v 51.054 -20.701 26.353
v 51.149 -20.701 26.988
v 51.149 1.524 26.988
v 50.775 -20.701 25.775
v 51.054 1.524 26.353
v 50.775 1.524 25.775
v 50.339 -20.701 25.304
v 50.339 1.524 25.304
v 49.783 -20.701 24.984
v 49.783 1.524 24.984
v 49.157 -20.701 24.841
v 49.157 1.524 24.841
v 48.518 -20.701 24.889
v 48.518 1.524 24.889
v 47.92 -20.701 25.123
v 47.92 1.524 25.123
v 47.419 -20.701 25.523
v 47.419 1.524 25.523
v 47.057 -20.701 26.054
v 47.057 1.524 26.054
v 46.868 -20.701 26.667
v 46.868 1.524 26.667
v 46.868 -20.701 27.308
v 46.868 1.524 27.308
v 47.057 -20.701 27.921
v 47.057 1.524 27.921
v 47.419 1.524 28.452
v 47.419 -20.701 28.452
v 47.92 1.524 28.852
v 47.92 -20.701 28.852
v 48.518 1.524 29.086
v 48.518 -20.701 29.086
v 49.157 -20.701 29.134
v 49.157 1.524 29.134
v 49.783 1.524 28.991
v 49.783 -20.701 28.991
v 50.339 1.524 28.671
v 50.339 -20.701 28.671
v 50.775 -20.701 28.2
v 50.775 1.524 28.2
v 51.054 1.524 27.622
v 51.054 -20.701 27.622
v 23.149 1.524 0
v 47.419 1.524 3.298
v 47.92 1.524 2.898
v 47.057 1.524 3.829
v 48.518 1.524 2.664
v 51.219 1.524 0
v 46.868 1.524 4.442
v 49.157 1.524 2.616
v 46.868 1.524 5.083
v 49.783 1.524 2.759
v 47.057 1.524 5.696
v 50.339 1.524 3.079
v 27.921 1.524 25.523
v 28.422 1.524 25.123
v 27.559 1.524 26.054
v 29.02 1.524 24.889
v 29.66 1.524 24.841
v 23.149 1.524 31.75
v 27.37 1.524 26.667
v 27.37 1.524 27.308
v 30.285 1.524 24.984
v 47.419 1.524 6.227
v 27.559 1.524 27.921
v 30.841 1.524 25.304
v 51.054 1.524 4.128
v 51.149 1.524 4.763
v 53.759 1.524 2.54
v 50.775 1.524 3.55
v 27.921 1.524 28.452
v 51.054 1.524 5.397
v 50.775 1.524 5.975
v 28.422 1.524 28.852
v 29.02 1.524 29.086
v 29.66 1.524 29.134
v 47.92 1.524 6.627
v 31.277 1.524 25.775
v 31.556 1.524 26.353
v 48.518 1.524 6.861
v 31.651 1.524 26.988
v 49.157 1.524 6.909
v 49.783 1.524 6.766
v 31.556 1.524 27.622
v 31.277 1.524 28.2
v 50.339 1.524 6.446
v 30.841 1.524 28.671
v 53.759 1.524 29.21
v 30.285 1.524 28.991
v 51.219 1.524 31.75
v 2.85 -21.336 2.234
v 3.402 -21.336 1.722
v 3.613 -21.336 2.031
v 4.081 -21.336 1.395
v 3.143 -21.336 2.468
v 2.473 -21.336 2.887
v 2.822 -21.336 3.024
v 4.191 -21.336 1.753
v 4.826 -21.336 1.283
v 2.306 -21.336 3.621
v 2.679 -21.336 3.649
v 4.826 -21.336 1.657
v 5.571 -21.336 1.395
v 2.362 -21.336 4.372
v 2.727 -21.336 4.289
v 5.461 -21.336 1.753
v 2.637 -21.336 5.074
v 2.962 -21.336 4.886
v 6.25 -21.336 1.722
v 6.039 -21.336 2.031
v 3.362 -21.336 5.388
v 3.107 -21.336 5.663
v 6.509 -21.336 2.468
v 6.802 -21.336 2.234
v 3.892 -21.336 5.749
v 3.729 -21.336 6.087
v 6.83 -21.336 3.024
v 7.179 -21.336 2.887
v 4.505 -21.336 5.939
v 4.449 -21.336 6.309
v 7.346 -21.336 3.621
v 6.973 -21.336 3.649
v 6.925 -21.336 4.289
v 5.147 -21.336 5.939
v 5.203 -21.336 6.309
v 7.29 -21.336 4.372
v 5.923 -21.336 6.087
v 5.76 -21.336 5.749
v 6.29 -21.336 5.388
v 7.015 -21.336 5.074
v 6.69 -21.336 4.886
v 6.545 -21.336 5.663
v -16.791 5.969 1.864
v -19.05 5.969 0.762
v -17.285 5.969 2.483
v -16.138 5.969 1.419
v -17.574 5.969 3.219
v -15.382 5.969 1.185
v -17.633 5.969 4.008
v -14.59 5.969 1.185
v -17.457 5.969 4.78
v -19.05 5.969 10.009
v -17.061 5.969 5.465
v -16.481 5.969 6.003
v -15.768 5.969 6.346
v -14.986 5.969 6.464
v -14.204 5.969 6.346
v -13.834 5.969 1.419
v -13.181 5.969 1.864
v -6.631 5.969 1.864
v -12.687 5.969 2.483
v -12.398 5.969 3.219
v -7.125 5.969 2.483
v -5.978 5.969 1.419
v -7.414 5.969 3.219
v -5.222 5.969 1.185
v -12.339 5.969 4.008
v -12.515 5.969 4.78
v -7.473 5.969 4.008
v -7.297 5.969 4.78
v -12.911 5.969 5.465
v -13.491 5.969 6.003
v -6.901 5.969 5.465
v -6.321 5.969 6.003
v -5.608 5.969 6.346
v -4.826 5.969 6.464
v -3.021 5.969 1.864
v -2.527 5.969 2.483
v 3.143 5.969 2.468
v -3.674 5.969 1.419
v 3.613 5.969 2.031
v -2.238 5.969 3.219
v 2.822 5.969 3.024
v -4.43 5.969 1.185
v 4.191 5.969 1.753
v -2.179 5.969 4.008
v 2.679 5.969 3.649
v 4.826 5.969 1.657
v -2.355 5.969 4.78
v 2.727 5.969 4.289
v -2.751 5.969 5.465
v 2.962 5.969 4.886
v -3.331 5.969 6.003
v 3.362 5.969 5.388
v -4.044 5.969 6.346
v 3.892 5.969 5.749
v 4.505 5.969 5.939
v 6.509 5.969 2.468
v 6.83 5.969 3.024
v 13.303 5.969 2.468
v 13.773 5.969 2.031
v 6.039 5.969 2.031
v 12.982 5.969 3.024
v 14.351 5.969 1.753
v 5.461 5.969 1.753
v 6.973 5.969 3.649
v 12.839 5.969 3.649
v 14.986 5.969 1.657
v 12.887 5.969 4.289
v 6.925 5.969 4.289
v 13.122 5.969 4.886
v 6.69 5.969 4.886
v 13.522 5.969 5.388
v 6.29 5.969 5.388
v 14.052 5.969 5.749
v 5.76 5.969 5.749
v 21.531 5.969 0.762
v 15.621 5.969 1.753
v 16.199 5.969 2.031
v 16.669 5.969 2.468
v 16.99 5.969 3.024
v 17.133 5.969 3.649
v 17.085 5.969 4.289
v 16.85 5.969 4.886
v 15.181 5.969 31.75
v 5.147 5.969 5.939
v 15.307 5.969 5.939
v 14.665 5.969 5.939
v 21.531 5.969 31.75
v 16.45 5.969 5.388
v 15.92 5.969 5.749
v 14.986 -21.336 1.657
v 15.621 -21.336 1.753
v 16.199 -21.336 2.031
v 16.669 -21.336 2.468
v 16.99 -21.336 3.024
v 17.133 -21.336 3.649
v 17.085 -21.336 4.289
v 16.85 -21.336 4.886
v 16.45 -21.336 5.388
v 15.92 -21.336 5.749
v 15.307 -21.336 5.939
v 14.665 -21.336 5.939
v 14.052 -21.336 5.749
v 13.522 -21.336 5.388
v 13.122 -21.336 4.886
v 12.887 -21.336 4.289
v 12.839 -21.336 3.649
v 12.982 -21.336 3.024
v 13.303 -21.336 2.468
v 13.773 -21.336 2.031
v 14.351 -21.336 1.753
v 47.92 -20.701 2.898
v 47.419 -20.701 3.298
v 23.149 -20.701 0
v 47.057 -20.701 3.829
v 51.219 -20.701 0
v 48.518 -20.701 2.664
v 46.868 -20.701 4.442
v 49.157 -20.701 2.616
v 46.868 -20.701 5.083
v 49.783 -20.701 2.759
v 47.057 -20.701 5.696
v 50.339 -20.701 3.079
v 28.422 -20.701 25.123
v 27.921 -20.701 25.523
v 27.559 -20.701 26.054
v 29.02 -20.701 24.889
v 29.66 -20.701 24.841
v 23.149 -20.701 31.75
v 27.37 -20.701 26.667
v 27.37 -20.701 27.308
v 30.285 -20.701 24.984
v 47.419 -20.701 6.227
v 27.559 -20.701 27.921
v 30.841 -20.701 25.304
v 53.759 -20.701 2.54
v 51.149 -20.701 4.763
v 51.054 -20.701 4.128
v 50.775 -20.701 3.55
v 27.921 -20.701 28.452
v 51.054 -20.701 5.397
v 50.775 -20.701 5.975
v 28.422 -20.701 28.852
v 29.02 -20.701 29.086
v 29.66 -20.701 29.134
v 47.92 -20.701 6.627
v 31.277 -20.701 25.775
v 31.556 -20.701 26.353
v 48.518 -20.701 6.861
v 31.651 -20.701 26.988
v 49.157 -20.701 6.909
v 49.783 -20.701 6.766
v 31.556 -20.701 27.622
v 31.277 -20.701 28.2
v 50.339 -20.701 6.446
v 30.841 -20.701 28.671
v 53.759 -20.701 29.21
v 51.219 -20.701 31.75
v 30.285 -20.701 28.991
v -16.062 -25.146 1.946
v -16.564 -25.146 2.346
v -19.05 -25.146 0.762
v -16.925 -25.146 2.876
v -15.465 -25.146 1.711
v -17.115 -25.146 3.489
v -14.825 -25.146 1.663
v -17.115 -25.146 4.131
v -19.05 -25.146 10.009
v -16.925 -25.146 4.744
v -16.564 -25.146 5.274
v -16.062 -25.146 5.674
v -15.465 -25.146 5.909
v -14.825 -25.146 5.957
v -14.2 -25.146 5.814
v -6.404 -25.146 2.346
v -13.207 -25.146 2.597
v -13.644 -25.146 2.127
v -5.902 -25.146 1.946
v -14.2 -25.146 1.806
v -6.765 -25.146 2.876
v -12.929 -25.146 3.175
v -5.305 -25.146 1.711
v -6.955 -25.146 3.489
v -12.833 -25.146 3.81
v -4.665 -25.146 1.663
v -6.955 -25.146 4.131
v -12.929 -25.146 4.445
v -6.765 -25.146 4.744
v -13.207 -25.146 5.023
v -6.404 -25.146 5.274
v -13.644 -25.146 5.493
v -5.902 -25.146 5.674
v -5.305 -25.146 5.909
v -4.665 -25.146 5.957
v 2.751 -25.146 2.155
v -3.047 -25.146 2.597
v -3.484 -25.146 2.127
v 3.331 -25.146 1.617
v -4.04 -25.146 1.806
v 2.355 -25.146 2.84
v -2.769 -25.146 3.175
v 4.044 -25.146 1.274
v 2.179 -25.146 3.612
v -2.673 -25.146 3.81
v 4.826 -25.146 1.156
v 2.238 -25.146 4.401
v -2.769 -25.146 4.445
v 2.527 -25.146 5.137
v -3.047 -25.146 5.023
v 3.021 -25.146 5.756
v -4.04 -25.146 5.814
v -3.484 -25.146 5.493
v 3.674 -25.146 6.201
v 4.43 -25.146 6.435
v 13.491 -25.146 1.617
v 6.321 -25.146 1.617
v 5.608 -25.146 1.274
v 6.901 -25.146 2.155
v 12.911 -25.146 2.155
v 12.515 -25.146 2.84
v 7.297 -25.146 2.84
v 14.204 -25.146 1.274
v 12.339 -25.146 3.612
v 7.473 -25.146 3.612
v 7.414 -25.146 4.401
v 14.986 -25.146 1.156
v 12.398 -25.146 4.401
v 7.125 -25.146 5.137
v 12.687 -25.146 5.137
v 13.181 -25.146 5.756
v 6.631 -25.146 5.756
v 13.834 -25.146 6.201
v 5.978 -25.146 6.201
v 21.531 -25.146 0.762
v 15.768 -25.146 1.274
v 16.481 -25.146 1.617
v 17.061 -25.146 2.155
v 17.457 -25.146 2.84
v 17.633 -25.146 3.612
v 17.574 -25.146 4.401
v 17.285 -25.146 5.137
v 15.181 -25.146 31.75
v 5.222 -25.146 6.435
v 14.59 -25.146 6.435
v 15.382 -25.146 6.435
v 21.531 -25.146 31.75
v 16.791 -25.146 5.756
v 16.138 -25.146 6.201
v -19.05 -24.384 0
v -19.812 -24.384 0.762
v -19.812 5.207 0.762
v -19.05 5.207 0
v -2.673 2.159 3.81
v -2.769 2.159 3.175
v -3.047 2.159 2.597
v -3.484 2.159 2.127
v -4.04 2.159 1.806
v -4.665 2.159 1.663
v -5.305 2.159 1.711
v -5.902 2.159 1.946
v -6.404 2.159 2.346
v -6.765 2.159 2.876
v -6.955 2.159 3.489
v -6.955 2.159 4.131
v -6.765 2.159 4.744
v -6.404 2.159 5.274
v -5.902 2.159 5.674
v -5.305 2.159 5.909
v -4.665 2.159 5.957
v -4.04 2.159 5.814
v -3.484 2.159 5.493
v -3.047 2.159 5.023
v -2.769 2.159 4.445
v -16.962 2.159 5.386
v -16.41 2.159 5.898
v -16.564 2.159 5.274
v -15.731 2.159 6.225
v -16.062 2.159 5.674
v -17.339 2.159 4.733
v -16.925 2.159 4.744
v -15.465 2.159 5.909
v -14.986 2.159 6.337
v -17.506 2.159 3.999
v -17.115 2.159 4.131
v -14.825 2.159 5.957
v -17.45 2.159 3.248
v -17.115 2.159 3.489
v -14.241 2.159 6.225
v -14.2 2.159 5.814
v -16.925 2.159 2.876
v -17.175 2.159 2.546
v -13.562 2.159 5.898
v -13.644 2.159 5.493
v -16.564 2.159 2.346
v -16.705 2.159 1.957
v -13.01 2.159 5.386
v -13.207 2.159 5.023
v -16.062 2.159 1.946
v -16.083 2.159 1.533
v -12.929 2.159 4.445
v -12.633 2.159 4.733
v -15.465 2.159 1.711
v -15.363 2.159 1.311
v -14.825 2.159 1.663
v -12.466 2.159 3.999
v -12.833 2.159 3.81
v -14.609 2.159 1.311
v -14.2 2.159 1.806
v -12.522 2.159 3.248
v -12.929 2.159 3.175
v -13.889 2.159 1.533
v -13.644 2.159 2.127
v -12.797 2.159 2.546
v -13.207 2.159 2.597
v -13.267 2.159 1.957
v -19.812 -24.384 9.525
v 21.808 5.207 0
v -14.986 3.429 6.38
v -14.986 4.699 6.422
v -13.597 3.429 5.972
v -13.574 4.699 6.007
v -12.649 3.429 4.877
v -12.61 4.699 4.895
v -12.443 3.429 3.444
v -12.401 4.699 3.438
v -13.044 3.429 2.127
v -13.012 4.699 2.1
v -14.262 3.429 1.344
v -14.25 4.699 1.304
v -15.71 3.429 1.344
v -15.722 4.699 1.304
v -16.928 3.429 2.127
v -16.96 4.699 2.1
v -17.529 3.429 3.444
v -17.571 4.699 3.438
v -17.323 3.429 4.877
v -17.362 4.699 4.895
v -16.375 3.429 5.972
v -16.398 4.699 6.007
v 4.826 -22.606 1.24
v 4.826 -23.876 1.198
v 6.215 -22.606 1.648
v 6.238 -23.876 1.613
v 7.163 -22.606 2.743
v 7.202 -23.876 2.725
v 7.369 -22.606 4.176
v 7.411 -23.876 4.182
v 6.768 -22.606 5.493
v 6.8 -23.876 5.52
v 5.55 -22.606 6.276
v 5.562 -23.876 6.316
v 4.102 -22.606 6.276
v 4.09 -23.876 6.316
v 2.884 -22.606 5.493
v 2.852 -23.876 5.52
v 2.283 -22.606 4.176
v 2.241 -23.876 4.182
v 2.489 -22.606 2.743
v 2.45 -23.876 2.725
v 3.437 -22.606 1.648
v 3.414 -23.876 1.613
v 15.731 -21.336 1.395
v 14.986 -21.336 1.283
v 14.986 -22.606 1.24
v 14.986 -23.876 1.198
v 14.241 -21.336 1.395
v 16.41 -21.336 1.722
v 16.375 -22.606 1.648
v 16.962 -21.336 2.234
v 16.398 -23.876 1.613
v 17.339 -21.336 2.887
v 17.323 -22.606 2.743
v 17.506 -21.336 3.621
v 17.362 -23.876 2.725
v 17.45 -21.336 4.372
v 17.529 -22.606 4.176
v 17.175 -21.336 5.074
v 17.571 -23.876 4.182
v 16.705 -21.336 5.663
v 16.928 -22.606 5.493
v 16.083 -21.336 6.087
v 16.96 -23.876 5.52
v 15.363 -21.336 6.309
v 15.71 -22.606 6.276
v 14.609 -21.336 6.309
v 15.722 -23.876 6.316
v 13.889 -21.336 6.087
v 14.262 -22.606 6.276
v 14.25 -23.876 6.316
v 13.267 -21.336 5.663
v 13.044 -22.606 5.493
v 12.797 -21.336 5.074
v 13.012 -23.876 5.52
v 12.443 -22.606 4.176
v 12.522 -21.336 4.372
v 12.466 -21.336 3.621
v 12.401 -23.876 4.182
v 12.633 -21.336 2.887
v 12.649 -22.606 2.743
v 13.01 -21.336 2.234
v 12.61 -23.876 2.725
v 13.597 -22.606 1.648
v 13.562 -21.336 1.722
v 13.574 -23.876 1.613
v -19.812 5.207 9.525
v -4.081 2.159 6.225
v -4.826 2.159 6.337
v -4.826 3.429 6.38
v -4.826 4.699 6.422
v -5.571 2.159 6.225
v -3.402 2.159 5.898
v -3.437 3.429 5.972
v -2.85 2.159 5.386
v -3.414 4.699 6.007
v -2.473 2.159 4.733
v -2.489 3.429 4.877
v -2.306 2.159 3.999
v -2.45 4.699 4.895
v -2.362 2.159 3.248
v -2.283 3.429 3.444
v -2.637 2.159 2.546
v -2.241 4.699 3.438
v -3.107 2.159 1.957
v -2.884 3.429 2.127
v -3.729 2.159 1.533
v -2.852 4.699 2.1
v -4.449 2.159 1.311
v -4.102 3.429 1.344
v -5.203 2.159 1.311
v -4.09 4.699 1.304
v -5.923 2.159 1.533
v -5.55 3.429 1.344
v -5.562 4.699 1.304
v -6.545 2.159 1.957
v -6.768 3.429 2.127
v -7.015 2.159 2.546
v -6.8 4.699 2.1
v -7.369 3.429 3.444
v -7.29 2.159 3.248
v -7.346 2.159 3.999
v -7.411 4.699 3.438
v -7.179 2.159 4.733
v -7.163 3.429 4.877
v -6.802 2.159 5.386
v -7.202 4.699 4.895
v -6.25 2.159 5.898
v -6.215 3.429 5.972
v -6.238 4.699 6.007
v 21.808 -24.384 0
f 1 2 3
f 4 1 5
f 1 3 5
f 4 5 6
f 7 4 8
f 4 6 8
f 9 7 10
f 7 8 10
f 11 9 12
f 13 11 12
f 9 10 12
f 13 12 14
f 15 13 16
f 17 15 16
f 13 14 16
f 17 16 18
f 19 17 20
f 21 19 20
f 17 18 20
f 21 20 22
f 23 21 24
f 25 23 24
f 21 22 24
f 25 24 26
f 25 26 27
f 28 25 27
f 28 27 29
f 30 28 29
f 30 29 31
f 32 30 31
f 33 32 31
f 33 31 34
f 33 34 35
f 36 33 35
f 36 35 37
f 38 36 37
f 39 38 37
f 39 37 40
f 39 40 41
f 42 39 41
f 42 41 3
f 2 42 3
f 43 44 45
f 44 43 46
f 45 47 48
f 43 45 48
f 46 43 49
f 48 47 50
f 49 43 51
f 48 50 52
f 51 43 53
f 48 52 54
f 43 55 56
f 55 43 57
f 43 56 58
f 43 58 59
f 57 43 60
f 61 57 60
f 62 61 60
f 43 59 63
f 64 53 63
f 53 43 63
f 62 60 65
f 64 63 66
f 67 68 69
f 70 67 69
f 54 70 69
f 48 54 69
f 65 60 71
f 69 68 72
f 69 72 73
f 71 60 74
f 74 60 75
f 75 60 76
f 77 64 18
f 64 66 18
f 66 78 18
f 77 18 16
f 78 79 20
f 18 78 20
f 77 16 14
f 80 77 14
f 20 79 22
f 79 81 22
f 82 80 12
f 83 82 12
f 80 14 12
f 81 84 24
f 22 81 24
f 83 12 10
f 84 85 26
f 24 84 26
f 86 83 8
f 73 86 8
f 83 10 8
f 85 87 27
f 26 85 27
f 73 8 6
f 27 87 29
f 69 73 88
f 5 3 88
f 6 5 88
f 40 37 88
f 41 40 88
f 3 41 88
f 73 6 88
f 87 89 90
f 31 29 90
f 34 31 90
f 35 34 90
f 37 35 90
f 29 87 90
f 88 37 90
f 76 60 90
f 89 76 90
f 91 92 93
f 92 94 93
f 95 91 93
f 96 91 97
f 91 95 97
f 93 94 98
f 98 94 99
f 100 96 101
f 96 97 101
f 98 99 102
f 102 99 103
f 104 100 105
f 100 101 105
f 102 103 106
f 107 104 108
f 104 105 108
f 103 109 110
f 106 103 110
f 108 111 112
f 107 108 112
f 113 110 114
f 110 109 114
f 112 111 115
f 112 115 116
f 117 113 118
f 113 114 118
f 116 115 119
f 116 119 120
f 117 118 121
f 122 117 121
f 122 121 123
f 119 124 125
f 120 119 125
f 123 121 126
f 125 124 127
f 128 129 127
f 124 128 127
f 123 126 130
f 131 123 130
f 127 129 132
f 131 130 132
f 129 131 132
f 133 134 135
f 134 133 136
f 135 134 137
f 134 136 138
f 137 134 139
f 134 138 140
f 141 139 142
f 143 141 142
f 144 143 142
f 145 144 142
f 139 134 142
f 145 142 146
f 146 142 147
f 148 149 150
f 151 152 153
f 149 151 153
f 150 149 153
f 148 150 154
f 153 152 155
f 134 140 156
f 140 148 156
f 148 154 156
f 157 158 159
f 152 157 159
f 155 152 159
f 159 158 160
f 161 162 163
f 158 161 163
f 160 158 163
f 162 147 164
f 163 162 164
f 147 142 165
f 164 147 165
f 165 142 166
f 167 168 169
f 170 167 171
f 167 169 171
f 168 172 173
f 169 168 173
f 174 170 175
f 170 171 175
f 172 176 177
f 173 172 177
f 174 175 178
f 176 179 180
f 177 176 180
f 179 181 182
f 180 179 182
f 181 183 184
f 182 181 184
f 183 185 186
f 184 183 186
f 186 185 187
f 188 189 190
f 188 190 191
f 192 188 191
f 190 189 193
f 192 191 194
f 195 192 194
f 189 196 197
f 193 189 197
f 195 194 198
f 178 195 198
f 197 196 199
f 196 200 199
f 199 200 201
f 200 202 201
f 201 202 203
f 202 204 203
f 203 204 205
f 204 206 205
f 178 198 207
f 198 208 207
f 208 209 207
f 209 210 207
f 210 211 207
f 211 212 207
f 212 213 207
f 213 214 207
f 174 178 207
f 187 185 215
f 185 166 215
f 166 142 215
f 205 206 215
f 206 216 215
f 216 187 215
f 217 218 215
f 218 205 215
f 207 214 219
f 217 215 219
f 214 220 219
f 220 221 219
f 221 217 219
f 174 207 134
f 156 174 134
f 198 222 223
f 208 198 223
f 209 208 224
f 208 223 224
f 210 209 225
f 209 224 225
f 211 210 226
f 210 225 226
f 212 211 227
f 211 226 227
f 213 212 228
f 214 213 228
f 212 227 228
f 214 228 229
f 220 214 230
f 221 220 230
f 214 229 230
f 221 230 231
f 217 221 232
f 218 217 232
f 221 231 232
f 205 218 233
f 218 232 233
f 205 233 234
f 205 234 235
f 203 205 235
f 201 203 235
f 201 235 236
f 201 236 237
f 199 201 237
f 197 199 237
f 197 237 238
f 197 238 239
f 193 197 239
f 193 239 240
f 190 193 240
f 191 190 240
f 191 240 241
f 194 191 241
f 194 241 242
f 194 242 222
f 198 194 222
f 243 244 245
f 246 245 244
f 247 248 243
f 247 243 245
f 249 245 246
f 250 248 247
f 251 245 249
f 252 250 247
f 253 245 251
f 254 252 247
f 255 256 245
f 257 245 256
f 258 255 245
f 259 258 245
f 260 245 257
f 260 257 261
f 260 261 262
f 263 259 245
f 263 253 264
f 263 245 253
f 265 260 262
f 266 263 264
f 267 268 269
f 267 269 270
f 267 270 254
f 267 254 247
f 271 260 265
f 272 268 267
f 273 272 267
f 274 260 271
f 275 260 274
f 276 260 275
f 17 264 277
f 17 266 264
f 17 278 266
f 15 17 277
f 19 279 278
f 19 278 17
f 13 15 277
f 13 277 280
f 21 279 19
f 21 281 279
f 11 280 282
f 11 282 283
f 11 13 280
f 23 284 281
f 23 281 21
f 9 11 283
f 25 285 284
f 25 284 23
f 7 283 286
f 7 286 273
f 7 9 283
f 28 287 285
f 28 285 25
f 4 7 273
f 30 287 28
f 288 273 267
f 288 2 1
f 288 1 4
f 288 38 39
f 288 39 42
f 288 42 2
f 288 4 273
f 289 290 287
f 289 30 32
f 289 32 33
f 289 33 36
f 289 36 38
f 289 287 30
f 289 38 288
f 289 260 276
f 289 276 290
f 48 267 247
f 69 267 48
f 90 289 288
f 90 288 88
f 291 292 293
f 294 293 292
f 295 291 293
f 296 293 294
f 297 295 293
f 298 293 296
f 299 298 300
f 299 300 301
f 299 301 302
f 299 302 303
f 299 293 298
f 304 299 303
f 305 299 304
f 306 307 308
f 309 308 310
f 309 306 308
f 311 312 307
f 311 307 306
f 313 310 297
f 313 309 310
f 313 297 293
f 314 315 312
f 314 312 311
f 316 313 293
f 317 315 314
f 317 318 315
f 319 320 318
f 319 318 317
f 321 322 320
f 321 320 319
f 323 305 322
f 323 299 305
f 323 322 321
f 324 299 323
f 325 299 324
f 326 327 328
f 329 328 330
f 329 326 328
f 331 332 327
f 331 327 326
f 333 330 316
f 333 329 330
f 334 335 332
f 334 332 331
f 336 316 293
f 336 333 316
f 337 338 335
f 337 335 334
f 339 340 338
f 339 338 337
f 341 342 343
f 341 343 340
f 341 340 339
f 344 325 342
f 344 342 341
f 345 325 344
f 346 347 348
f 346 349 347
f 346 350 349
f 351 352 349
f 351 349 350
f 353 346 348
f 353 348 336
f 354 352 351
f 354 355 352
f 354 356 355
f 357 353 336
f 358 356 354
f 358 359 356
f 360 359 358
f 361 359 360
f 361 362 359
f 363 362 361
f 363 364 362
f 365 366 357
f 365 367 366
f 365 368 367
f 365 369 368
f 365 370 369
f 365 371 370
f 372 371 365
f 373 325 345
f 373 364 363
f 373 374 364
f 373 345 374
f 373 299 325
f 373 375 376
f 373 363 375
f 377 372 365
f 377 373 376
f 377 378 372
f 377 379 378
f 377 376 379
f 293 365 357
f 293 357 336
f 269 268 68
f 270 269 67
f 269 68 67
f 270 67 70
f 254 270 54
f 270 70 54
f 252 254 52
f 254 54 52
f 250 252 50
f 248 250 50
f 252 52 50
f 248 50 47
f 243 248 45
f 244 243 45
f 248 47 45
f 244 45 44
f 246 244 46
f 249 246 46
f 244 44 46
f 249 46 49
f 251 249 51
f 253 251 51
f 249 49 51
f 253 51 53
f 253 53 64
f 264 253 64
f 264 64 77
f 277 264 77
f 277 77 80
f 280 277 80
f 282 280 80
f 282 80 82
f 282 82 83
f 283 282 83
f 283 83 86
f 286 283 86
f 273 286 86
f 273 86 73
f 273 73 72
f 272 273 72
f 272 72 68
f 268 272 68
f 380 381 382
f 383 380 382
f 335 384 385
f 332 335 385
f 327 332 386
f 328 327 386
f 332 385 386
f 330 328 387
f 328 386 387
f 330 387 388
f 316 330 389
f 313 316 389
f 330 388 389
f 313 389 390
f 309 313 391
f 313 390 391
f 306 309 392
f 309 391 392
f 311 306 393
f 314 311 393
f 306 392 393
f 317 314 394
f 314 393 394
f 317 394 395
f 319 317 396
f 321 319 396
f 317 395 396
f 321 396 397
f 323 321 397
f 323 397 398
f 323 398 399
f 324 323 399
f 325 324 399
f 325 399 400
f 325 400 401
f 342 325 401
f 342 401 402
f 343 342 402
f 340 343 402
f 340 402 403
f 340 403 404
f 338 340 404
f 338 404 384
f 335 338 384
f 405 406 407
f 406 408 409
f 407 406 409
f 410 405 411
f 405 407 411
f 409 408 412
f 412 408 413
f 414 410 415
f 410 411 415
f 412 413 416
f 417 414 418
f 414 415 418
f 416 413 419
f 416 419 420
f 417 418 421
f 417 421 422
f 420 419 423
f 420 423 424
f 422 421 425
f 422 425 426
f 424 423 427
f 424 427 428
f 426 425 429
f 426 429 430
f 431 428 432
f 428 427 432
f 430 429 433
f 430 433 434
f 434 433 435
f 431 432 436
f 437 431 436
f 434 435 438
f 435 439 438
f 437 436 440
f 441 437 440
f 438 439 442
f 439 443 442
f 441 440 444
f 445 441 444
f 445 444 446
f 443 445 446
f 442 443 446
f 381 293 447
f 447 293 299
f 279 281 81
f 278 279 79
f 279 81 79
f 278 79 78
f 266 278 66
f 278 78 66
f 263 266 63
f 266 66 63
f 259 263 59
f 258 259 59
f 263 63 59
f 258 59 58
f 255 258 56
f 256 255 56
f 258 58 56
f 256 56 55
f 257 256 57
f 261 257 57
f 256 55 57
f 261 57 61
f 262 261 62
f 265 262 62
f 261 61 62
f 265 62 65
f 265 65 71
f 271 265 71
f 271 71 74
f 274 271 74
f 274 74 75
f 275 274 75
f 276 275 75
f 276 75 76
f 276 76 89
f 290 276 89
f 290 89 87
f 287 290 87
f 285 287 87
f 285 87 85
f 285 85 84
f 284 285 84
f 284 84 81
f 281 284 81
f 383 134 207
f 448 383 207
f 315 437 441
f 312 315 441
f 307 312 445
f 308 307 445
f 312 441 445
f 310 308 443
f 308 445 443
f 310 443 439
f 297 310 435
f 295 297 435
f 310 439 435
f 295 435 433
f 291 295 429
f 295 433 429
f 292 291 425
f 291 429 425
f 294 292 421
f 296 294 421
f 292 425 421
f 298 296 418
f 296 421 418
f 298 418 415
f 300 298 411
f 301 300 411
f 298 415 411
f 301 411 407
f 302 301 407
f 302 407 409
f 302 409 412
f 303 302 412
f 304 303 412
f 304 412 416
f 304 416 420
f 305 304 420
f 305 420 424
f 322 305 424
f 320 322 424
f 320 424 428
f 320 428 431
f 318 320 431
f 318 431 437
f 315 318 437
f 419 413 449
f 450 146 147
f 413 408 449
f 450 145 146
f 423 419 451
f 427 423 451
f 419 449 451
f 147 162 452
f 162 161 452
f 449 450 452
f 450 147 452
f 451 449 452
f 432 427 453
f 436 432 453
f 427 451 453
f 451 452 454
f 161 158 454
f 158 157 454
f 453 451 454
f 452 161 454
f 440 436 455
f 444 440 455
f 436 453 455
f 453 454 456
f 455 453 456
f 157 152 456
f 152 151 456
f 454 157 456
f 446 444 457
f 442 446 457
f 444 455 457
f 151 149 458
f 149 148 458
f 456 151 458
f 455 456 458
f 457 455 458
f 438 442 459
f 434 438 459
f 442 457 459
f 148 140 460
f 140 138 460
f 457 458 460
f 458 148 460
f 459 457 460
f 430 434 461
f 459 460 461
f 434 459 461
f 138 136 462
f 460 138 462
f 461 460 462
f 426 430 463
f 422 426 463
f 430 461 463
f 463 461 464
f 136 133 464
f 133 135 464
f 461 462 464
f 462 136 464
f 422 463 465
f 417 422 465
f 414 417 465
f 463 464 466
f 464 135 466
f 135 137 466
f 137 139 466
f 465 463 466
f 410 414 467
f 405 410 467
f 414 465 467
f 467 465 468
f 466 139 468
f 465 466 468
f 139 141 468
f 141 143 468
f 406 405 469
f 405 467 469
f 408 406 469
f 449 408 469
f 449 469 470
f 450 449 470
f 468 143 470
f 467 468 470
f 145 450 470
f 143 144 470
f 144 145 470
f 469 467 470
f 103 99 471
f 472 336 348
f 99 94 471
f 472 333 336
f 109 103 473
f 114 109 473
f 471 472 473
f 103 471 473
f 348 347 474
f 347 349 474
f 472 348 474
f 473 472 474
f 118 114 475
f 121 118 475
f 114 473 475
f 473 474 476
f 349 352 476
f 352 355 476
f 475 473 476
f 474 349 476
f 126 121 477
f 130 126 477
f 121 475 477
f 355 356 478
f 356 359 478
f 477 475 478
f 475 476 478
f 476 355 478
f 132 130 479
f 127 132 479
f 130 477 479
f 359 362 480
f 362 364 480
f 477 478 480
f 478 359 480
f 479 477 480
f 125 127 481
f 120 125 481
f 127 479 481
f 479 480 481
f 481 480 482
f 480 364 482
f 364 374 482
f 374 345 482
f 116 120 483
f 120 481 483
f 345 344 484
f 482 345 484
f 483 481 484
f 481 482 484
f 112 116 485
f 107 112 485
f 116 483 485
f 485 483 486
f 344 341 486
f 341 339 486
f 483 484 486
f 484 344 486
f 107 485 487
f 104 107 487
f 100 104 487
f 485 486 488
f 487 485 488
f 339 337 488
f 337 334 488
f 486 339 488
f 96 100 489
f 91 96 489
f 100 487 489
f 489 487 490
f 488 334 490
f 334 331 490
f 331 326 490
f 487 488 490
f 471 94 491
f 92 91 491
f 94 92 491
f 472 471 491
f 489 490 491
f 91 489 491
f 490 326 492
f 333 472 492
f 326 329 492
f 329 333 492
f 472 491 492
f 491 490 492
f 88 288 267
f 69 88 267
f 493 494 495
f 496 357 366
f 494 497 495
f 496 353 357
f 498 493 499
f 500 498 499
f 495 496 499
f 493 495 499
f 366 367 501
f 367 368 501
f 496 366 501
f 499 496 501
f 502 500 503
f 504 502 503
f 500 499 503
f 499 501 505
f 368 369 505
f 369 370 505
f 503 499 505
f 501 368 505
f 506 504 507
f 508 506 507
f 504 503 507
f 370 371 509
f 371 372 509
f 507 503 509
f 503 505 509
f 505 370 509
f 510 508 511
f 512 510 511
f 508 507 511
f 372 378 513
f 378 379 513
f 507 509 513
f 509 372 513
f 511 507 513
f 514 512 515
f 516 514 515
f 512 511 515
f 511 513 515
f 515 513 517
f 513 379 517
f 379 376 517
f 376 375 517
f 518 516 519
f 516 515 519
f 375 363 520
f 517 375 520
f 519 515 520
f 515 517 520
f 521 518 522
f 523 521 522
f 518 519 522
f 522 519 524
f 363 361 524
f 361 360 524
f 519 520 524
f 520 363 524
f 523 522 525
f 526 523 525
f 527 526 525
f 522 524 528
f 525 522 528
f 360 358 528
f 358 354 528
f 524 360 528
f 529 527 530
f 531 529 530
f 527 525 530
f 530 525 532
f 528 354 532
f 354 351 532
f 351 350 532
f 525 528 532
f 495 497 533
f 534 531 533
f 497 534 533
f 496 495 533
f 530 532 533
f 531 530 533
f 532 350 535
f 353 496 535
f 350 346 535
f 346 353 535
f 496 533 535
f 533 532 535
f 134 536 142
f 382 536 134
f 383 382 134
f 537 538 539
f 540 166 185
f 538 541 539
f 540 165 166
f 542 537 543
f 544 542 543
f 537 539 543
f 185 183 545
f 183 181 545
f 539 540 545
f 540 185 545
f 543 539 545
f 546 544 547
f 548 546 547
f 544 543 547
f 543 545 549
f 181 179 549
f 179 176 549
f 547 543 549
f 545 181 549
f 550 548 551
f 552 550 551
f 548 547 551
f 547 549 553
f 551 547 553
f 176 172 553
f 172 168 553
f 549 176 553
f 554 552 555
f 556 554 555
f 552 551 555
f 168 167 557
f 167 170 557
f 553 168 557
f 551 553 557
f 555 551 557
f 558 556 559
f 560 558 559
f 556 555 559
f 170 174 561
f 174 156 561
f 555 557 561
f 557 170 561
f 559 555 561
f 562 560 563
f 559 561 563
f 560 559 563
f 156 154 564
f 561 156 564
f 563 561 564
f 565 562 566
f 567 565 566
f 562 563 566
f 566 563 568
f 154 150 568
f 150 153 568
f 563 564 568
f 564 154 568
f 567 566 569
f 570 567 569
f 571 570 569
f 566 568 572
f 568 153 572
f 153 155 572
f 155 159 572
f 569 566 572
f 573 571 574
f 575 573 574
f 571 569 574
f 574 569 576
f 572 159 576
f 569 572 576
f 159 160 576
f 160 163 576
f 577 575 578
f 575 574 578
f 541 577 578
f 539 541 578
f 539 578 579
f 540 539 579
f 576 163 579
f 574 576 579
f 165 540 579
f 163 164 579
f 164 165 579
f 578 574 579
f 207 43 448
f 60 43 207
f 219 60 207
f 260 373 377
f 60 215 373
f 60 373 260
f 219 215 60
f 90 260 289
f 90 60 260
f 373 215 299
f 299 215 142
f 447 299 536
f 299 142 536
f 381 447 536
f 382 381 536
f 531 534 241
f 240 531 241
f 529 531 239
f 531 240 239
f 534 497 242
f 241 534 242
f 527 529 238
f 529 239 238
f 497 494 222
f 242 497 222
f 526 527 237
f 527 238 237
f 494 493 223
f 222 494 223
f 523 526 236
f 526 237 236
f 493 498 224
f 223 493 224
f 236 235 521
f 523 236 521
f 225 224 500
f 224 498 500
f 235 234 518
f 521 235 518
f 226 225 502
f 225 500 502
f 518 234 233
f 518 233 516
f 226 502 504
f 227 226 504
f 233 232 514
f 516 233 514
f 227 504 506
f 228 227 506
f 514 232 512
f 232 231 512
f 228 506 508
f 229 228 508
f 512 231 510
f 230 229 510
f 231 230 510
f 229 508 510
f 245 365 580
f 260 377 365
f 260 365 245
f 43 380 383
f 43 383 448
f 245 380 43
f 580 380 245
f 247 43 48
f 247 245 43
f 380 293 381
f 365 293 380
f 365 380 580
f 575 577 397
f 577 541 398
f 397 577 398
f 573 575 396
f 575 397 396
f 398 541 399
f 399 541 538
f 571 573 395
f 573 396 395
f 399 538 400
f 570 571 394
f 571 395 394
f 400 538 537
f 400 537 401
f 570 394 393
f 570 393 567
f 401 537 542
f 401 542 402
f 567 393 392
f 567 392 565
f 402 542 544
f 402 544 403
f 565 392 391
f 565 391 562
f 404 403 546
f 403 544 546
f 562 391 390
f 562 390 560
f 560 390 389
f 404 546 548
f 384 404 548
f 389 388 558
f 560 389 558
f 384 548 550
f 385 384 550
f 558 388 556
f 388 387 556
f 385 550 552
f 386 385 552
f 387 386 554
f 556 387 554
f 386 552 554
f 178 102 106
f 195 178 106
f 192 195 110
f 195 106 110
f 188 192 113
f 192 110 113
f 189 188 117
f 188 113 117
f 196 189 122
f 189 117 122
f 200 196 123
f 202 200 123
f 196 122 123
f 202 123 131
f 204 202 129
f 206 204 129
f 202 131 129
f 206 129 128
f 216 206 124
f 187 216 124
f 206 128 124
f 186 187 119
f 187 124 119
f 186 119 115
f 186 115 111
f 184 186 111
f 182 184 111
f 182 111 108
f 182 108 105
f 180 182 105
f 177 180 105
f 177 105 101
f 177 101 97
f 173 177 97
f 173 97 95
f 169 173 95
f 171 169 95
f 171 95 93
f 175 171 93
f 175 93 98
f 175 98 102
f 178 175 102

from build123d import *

# Parameters (mm, degrees)
SKETCH1_W                       = 42.960806382
SKETCH1_H                       = 31.115
BOSS_EXTRUDE1_DEPTH             = 12.7
SKETCH2_W                       = 42.960806382
SKETCH2_H                       = 22.225
BOSS_EXTRUDE2_DEPTH             = 19.05
BOSS_EXTRUDE3_DEPTH             = 22.225
DRAFT1_START                    = 15
DRAFT1_OUTLINE_W                = 22.225
DRAFT1_OUTLINE_H                = 19.270002336
DRAFT1_DEPTH                    = 6.752762537
BOSS_EXTRUDE4_REACH             = 69.308
SKETCH6_W                       = 42.960806382
SKETCH6_H                       = 4.445
DRAFT3_ANGLE                    = 20
DRAFT4_ANGLE                    = 20
BOSS_EXTRUDE5_DEPTH             = 22.225
F_6_CLEARANCE_HOLE1_D           = 4.3053
F_6_CLEARANCE_HOLE2_D           = 4.3053
F_6_CLEARANCE_HOLE2_ON_FACE_2_D = 4.3053
HOLE1_AT_2_COUNT                = 2
HOLE1_AT_2_PITCH                = 10.16
HOLE2_AT_2_COUNT                = 2
HOLE2_AT_2_PITCH                = 10.16
CUT_EXTRUDE1_DEPTH              = 70.758470007
CHAMFER1_SIZE                   = 2.54
CHAMFER2_SIZE                   = 0.762


with BuildPart() as part:
    # Sketch1 → Boss-Extrude1 (new body)
    with BuildSketch(Plane.XY):
        with Locations((1.668403191, -9.5885)):
            Rectangle(SKETCH1_W, SKETCH1_H)
    extrude(amount=BOSS_EXTRUDE1_DEPTH)

    # Sketch2 → Boss-Extrude2 (add)
    with BuildSketch(Plane.XY.offset(12.7)):
        with Locations((1.668403191, -9.5885)):
            Rectangle(SKETCH2_W, SKETCH2_H)
    extrude(amount=BOSS_EXTRUDE2_DEPTH)

    # Sketch3 → Boss-Extrude3 (add)
    with BuildSketch(Plane.XZ.offset(20.701)):
        Polygon((23.148806382, 31.75), (53.759077492, 31.75), (53.759077492, 0), (44.234077492, 0), (44.234077492, 18.107878998), (23.148806382, 18.107878998), align=None)
    extrude(amount=-BOSS_EXTRUDE3_DEPTH)

    # Draft1: read off the stored shape, not the designer's step
    # Draft1 outline → Draft1 (add)
    with BuildSketch(Plane(origin=(0, 0, 0), x_dir=(0, 1, 0), z_dir=(0.9396926207859083, 0, -0.3420201433256691)).offset(DRAFT1_START)):
        with Locations((-9.5885, 17.552359245)):
            Rectangle(DRAFT1_OUTLINE_W, DRAFT1_OUTLINE_H)
    extrude(amount=DRAFT1_DEPTH)

    # Sketch6 → Boss-Extrude4 (add, up to next)
    with BuildSketch(Plane.XY.offset(31.75), mode=Mode.PRIVATE) as boss_extrude4_sk1:
        with Locations((1.668403191, 3.7465)):
            Rectangle(SKETCH6_W, SKETCH6_H)
    boss_extrude4_tool1 = extrude(boss_extrude4_sk1.sketch, amount=-BOSS_EXTRUDE4_REACH, mode=Mode.PRIVATE) - part.part
    # Sketch6 → Boss-Extrude4 (add, up to next)
    with BuildSketch(Plane.XY.offset(31.75), mode=Mode.PRIVATE) as boss_extrude4_sk2:
        with Locations((1.668403191, -22.9235)):
            Rectangle(SKETCH6_W, SKETCH6_H)
    boss_extrude4_tool2 = extrude(boss_extrude4_sk2.sketch, amount=-BOSS_EXTRUDE4_REACH, mode=Mode.PRIVATE) - part.part
    add(boss_extrude4_tool1.solids().sort_by_distance((1.668403, 3.7465, 31.75))[0])
    add(boss_extrude4_tool2.solids().sort_by_distance((1.668403, -22.9235, 31.75))[0])

    # Draft3
    draft3_faces = [part.faces().sort_by_distance(p)[0] for p in [
        (23.148806382, -22.9235, 15.875),
    ]]
    draft(draft3_faces, Plane(origin=(23.148806382, -20.701, 31.75), x_dir=(-1, 0, 0), z_dir=(0, -1, 0)), DRAFT3_ANGLE)

    # Draft4
    draft4_faces = [part.faces().sort_by_distance(p)[0] for p in [
        (23.148806382, 3.7465, 15.875),
    ]]
    draft(draft4_faces, Plane(origin=(23.148806382, 1.524, 31.75), x_dir=(1, 0, 0), z_dir=(0, 1, 0)), DRAFT4_ANGLE)

    # Sketch8 → Boss-Extrude5 (add)
    with BuildSketch(Plane.XZ.offset(20.701)):
        Polygon((29.739535343, 18.107878998), (23.148806382, 0), (44.234077492, 0), (44.234077492, 18.107878998), align=None)
    extrude(amount=-BOSS_EXTRUDE5_DEPTH)

    # #6 Clearance Hole1 (through all)
    with Locations(Plane(origin=(0, -20.701, 0), x_dir=(-1, 0, 0), z_dir=(0, -1, 0))):
        with Locations((-48.996577492, -26.9875), (-48.996577492, -4.7625), (-29.498806382, -26.9875)):
            Hole(F_6_CLEARANCE_HOLE1_D / 2)

    # #6 Clearance Hole2 (through all)
    with Locations(Plane(origin=(-14.986, -25.146, 3.81), x_dir=(-1, 0, 0), z_dir=(0, -1, 0))):
        with Locations((0, 0), (-10.16, 0)):
            Hole(F_6_CLEARANCE_HOLE2_D / 2)

    # #6 Clearance Hole2 on face 2 (through all)
    with Locations(Plane(origin=(14.986, 5.969, 3.81), x_dir=(0, 0, 1), z_dir=(0, 1, 0))):
        with Locations((0, 0), (0, -10.16)):
            Hole(F_6_CLEARANCE_HOLE2_ON_FACE_2_D / 2)

    # Sketch18 → Hole1 (revolve, cut)
    with BuildSketch(Plane(origin=(-4.826, 5.969, 3.81), x_dir=(0, 0, 1), z_dir=(1, 0, 0))):
        Polygon((0, 0), (0, 3.81), (2.5273, 3.81), (2.6543, 0), align=None)
    hole1 = revolve(axis=Axis((-4.826, -104.031, 3.81), (0, 1, 0)), mode=Mode.SUBTRACT)

    # Hole1 at 2: Hole1 ×2
    with Locations(*[(-i * HOLE1_AT_2_PITCH, 0, 0) for i in range(1, HOLE1_AT_2_COUNT)]):
        add(hole1, mode=Mode.SUBTRACT)

    # Sketch20 → Hole2 (revolve, cut)
    with BuildSketch(Plane(origin=(4.826, -25.146, 3.81), x_dir=(0, 0, -1), z_dir=(1, 0, 0))):
        Polygon((0, 0), (0, 3.81), (2.5273, 3.81), (2.6543, 0), align=None)
    hole2 = revolve(axis=Axis((4.826, 84.854, 3.81), (0, -1, 0)), mode=Mode.SUBTRACT)

    # Hole2 at 2: Hole2 ×2
    with Locations(*[(i * HOLE2_AT_2_PITCH, 0, 0) for i in range(1, HOLE2_AT_2_COUNT)]):
        add(hole2, mode=Mode.SUBTRACT)

    # Sketch21 → Cut-Extrude1 (cut, through all)
    with BuildSketch(Plane(origin=(0, 5.969, 0), x_dir=(1, 0, 0), z_dir=(0, 1, 0))):
        Polygon((-19.812, -9.525), (-19.812, -31.75), (15.180958691, -31.75), align=None)
    extrude(amount=-CUT_EXTRUDE1_DEPTH, mode=Mode.SUBTRACT)

    # Chamfer1
    chamfer1_edges = [part.edges().sort_by_distance(p)[0] for p in [
        (53.759077492, -9.5885, 31.75),
        (53.759077492, -9.5885, 0),
    ]]
    chamfer(chamfer1_edges, length=CHAMFER1_SIZE)

    # Chamfer2
    chamfer2_edges = [part.edges().sort_by_distance(p)[0] for p in [
        (-19.812, -25.146, 4.7625),
        (-19.812, 5.969, 4.7625),
        (0.859479345, -25.146, 0),
        (-19.812, -9.5885, 0),
        (0.859479345, 5.969, 0),
    ]]
    chamfer(chamfer2_edges, length=CHAMFER2_SIZE)


solid = part.part
